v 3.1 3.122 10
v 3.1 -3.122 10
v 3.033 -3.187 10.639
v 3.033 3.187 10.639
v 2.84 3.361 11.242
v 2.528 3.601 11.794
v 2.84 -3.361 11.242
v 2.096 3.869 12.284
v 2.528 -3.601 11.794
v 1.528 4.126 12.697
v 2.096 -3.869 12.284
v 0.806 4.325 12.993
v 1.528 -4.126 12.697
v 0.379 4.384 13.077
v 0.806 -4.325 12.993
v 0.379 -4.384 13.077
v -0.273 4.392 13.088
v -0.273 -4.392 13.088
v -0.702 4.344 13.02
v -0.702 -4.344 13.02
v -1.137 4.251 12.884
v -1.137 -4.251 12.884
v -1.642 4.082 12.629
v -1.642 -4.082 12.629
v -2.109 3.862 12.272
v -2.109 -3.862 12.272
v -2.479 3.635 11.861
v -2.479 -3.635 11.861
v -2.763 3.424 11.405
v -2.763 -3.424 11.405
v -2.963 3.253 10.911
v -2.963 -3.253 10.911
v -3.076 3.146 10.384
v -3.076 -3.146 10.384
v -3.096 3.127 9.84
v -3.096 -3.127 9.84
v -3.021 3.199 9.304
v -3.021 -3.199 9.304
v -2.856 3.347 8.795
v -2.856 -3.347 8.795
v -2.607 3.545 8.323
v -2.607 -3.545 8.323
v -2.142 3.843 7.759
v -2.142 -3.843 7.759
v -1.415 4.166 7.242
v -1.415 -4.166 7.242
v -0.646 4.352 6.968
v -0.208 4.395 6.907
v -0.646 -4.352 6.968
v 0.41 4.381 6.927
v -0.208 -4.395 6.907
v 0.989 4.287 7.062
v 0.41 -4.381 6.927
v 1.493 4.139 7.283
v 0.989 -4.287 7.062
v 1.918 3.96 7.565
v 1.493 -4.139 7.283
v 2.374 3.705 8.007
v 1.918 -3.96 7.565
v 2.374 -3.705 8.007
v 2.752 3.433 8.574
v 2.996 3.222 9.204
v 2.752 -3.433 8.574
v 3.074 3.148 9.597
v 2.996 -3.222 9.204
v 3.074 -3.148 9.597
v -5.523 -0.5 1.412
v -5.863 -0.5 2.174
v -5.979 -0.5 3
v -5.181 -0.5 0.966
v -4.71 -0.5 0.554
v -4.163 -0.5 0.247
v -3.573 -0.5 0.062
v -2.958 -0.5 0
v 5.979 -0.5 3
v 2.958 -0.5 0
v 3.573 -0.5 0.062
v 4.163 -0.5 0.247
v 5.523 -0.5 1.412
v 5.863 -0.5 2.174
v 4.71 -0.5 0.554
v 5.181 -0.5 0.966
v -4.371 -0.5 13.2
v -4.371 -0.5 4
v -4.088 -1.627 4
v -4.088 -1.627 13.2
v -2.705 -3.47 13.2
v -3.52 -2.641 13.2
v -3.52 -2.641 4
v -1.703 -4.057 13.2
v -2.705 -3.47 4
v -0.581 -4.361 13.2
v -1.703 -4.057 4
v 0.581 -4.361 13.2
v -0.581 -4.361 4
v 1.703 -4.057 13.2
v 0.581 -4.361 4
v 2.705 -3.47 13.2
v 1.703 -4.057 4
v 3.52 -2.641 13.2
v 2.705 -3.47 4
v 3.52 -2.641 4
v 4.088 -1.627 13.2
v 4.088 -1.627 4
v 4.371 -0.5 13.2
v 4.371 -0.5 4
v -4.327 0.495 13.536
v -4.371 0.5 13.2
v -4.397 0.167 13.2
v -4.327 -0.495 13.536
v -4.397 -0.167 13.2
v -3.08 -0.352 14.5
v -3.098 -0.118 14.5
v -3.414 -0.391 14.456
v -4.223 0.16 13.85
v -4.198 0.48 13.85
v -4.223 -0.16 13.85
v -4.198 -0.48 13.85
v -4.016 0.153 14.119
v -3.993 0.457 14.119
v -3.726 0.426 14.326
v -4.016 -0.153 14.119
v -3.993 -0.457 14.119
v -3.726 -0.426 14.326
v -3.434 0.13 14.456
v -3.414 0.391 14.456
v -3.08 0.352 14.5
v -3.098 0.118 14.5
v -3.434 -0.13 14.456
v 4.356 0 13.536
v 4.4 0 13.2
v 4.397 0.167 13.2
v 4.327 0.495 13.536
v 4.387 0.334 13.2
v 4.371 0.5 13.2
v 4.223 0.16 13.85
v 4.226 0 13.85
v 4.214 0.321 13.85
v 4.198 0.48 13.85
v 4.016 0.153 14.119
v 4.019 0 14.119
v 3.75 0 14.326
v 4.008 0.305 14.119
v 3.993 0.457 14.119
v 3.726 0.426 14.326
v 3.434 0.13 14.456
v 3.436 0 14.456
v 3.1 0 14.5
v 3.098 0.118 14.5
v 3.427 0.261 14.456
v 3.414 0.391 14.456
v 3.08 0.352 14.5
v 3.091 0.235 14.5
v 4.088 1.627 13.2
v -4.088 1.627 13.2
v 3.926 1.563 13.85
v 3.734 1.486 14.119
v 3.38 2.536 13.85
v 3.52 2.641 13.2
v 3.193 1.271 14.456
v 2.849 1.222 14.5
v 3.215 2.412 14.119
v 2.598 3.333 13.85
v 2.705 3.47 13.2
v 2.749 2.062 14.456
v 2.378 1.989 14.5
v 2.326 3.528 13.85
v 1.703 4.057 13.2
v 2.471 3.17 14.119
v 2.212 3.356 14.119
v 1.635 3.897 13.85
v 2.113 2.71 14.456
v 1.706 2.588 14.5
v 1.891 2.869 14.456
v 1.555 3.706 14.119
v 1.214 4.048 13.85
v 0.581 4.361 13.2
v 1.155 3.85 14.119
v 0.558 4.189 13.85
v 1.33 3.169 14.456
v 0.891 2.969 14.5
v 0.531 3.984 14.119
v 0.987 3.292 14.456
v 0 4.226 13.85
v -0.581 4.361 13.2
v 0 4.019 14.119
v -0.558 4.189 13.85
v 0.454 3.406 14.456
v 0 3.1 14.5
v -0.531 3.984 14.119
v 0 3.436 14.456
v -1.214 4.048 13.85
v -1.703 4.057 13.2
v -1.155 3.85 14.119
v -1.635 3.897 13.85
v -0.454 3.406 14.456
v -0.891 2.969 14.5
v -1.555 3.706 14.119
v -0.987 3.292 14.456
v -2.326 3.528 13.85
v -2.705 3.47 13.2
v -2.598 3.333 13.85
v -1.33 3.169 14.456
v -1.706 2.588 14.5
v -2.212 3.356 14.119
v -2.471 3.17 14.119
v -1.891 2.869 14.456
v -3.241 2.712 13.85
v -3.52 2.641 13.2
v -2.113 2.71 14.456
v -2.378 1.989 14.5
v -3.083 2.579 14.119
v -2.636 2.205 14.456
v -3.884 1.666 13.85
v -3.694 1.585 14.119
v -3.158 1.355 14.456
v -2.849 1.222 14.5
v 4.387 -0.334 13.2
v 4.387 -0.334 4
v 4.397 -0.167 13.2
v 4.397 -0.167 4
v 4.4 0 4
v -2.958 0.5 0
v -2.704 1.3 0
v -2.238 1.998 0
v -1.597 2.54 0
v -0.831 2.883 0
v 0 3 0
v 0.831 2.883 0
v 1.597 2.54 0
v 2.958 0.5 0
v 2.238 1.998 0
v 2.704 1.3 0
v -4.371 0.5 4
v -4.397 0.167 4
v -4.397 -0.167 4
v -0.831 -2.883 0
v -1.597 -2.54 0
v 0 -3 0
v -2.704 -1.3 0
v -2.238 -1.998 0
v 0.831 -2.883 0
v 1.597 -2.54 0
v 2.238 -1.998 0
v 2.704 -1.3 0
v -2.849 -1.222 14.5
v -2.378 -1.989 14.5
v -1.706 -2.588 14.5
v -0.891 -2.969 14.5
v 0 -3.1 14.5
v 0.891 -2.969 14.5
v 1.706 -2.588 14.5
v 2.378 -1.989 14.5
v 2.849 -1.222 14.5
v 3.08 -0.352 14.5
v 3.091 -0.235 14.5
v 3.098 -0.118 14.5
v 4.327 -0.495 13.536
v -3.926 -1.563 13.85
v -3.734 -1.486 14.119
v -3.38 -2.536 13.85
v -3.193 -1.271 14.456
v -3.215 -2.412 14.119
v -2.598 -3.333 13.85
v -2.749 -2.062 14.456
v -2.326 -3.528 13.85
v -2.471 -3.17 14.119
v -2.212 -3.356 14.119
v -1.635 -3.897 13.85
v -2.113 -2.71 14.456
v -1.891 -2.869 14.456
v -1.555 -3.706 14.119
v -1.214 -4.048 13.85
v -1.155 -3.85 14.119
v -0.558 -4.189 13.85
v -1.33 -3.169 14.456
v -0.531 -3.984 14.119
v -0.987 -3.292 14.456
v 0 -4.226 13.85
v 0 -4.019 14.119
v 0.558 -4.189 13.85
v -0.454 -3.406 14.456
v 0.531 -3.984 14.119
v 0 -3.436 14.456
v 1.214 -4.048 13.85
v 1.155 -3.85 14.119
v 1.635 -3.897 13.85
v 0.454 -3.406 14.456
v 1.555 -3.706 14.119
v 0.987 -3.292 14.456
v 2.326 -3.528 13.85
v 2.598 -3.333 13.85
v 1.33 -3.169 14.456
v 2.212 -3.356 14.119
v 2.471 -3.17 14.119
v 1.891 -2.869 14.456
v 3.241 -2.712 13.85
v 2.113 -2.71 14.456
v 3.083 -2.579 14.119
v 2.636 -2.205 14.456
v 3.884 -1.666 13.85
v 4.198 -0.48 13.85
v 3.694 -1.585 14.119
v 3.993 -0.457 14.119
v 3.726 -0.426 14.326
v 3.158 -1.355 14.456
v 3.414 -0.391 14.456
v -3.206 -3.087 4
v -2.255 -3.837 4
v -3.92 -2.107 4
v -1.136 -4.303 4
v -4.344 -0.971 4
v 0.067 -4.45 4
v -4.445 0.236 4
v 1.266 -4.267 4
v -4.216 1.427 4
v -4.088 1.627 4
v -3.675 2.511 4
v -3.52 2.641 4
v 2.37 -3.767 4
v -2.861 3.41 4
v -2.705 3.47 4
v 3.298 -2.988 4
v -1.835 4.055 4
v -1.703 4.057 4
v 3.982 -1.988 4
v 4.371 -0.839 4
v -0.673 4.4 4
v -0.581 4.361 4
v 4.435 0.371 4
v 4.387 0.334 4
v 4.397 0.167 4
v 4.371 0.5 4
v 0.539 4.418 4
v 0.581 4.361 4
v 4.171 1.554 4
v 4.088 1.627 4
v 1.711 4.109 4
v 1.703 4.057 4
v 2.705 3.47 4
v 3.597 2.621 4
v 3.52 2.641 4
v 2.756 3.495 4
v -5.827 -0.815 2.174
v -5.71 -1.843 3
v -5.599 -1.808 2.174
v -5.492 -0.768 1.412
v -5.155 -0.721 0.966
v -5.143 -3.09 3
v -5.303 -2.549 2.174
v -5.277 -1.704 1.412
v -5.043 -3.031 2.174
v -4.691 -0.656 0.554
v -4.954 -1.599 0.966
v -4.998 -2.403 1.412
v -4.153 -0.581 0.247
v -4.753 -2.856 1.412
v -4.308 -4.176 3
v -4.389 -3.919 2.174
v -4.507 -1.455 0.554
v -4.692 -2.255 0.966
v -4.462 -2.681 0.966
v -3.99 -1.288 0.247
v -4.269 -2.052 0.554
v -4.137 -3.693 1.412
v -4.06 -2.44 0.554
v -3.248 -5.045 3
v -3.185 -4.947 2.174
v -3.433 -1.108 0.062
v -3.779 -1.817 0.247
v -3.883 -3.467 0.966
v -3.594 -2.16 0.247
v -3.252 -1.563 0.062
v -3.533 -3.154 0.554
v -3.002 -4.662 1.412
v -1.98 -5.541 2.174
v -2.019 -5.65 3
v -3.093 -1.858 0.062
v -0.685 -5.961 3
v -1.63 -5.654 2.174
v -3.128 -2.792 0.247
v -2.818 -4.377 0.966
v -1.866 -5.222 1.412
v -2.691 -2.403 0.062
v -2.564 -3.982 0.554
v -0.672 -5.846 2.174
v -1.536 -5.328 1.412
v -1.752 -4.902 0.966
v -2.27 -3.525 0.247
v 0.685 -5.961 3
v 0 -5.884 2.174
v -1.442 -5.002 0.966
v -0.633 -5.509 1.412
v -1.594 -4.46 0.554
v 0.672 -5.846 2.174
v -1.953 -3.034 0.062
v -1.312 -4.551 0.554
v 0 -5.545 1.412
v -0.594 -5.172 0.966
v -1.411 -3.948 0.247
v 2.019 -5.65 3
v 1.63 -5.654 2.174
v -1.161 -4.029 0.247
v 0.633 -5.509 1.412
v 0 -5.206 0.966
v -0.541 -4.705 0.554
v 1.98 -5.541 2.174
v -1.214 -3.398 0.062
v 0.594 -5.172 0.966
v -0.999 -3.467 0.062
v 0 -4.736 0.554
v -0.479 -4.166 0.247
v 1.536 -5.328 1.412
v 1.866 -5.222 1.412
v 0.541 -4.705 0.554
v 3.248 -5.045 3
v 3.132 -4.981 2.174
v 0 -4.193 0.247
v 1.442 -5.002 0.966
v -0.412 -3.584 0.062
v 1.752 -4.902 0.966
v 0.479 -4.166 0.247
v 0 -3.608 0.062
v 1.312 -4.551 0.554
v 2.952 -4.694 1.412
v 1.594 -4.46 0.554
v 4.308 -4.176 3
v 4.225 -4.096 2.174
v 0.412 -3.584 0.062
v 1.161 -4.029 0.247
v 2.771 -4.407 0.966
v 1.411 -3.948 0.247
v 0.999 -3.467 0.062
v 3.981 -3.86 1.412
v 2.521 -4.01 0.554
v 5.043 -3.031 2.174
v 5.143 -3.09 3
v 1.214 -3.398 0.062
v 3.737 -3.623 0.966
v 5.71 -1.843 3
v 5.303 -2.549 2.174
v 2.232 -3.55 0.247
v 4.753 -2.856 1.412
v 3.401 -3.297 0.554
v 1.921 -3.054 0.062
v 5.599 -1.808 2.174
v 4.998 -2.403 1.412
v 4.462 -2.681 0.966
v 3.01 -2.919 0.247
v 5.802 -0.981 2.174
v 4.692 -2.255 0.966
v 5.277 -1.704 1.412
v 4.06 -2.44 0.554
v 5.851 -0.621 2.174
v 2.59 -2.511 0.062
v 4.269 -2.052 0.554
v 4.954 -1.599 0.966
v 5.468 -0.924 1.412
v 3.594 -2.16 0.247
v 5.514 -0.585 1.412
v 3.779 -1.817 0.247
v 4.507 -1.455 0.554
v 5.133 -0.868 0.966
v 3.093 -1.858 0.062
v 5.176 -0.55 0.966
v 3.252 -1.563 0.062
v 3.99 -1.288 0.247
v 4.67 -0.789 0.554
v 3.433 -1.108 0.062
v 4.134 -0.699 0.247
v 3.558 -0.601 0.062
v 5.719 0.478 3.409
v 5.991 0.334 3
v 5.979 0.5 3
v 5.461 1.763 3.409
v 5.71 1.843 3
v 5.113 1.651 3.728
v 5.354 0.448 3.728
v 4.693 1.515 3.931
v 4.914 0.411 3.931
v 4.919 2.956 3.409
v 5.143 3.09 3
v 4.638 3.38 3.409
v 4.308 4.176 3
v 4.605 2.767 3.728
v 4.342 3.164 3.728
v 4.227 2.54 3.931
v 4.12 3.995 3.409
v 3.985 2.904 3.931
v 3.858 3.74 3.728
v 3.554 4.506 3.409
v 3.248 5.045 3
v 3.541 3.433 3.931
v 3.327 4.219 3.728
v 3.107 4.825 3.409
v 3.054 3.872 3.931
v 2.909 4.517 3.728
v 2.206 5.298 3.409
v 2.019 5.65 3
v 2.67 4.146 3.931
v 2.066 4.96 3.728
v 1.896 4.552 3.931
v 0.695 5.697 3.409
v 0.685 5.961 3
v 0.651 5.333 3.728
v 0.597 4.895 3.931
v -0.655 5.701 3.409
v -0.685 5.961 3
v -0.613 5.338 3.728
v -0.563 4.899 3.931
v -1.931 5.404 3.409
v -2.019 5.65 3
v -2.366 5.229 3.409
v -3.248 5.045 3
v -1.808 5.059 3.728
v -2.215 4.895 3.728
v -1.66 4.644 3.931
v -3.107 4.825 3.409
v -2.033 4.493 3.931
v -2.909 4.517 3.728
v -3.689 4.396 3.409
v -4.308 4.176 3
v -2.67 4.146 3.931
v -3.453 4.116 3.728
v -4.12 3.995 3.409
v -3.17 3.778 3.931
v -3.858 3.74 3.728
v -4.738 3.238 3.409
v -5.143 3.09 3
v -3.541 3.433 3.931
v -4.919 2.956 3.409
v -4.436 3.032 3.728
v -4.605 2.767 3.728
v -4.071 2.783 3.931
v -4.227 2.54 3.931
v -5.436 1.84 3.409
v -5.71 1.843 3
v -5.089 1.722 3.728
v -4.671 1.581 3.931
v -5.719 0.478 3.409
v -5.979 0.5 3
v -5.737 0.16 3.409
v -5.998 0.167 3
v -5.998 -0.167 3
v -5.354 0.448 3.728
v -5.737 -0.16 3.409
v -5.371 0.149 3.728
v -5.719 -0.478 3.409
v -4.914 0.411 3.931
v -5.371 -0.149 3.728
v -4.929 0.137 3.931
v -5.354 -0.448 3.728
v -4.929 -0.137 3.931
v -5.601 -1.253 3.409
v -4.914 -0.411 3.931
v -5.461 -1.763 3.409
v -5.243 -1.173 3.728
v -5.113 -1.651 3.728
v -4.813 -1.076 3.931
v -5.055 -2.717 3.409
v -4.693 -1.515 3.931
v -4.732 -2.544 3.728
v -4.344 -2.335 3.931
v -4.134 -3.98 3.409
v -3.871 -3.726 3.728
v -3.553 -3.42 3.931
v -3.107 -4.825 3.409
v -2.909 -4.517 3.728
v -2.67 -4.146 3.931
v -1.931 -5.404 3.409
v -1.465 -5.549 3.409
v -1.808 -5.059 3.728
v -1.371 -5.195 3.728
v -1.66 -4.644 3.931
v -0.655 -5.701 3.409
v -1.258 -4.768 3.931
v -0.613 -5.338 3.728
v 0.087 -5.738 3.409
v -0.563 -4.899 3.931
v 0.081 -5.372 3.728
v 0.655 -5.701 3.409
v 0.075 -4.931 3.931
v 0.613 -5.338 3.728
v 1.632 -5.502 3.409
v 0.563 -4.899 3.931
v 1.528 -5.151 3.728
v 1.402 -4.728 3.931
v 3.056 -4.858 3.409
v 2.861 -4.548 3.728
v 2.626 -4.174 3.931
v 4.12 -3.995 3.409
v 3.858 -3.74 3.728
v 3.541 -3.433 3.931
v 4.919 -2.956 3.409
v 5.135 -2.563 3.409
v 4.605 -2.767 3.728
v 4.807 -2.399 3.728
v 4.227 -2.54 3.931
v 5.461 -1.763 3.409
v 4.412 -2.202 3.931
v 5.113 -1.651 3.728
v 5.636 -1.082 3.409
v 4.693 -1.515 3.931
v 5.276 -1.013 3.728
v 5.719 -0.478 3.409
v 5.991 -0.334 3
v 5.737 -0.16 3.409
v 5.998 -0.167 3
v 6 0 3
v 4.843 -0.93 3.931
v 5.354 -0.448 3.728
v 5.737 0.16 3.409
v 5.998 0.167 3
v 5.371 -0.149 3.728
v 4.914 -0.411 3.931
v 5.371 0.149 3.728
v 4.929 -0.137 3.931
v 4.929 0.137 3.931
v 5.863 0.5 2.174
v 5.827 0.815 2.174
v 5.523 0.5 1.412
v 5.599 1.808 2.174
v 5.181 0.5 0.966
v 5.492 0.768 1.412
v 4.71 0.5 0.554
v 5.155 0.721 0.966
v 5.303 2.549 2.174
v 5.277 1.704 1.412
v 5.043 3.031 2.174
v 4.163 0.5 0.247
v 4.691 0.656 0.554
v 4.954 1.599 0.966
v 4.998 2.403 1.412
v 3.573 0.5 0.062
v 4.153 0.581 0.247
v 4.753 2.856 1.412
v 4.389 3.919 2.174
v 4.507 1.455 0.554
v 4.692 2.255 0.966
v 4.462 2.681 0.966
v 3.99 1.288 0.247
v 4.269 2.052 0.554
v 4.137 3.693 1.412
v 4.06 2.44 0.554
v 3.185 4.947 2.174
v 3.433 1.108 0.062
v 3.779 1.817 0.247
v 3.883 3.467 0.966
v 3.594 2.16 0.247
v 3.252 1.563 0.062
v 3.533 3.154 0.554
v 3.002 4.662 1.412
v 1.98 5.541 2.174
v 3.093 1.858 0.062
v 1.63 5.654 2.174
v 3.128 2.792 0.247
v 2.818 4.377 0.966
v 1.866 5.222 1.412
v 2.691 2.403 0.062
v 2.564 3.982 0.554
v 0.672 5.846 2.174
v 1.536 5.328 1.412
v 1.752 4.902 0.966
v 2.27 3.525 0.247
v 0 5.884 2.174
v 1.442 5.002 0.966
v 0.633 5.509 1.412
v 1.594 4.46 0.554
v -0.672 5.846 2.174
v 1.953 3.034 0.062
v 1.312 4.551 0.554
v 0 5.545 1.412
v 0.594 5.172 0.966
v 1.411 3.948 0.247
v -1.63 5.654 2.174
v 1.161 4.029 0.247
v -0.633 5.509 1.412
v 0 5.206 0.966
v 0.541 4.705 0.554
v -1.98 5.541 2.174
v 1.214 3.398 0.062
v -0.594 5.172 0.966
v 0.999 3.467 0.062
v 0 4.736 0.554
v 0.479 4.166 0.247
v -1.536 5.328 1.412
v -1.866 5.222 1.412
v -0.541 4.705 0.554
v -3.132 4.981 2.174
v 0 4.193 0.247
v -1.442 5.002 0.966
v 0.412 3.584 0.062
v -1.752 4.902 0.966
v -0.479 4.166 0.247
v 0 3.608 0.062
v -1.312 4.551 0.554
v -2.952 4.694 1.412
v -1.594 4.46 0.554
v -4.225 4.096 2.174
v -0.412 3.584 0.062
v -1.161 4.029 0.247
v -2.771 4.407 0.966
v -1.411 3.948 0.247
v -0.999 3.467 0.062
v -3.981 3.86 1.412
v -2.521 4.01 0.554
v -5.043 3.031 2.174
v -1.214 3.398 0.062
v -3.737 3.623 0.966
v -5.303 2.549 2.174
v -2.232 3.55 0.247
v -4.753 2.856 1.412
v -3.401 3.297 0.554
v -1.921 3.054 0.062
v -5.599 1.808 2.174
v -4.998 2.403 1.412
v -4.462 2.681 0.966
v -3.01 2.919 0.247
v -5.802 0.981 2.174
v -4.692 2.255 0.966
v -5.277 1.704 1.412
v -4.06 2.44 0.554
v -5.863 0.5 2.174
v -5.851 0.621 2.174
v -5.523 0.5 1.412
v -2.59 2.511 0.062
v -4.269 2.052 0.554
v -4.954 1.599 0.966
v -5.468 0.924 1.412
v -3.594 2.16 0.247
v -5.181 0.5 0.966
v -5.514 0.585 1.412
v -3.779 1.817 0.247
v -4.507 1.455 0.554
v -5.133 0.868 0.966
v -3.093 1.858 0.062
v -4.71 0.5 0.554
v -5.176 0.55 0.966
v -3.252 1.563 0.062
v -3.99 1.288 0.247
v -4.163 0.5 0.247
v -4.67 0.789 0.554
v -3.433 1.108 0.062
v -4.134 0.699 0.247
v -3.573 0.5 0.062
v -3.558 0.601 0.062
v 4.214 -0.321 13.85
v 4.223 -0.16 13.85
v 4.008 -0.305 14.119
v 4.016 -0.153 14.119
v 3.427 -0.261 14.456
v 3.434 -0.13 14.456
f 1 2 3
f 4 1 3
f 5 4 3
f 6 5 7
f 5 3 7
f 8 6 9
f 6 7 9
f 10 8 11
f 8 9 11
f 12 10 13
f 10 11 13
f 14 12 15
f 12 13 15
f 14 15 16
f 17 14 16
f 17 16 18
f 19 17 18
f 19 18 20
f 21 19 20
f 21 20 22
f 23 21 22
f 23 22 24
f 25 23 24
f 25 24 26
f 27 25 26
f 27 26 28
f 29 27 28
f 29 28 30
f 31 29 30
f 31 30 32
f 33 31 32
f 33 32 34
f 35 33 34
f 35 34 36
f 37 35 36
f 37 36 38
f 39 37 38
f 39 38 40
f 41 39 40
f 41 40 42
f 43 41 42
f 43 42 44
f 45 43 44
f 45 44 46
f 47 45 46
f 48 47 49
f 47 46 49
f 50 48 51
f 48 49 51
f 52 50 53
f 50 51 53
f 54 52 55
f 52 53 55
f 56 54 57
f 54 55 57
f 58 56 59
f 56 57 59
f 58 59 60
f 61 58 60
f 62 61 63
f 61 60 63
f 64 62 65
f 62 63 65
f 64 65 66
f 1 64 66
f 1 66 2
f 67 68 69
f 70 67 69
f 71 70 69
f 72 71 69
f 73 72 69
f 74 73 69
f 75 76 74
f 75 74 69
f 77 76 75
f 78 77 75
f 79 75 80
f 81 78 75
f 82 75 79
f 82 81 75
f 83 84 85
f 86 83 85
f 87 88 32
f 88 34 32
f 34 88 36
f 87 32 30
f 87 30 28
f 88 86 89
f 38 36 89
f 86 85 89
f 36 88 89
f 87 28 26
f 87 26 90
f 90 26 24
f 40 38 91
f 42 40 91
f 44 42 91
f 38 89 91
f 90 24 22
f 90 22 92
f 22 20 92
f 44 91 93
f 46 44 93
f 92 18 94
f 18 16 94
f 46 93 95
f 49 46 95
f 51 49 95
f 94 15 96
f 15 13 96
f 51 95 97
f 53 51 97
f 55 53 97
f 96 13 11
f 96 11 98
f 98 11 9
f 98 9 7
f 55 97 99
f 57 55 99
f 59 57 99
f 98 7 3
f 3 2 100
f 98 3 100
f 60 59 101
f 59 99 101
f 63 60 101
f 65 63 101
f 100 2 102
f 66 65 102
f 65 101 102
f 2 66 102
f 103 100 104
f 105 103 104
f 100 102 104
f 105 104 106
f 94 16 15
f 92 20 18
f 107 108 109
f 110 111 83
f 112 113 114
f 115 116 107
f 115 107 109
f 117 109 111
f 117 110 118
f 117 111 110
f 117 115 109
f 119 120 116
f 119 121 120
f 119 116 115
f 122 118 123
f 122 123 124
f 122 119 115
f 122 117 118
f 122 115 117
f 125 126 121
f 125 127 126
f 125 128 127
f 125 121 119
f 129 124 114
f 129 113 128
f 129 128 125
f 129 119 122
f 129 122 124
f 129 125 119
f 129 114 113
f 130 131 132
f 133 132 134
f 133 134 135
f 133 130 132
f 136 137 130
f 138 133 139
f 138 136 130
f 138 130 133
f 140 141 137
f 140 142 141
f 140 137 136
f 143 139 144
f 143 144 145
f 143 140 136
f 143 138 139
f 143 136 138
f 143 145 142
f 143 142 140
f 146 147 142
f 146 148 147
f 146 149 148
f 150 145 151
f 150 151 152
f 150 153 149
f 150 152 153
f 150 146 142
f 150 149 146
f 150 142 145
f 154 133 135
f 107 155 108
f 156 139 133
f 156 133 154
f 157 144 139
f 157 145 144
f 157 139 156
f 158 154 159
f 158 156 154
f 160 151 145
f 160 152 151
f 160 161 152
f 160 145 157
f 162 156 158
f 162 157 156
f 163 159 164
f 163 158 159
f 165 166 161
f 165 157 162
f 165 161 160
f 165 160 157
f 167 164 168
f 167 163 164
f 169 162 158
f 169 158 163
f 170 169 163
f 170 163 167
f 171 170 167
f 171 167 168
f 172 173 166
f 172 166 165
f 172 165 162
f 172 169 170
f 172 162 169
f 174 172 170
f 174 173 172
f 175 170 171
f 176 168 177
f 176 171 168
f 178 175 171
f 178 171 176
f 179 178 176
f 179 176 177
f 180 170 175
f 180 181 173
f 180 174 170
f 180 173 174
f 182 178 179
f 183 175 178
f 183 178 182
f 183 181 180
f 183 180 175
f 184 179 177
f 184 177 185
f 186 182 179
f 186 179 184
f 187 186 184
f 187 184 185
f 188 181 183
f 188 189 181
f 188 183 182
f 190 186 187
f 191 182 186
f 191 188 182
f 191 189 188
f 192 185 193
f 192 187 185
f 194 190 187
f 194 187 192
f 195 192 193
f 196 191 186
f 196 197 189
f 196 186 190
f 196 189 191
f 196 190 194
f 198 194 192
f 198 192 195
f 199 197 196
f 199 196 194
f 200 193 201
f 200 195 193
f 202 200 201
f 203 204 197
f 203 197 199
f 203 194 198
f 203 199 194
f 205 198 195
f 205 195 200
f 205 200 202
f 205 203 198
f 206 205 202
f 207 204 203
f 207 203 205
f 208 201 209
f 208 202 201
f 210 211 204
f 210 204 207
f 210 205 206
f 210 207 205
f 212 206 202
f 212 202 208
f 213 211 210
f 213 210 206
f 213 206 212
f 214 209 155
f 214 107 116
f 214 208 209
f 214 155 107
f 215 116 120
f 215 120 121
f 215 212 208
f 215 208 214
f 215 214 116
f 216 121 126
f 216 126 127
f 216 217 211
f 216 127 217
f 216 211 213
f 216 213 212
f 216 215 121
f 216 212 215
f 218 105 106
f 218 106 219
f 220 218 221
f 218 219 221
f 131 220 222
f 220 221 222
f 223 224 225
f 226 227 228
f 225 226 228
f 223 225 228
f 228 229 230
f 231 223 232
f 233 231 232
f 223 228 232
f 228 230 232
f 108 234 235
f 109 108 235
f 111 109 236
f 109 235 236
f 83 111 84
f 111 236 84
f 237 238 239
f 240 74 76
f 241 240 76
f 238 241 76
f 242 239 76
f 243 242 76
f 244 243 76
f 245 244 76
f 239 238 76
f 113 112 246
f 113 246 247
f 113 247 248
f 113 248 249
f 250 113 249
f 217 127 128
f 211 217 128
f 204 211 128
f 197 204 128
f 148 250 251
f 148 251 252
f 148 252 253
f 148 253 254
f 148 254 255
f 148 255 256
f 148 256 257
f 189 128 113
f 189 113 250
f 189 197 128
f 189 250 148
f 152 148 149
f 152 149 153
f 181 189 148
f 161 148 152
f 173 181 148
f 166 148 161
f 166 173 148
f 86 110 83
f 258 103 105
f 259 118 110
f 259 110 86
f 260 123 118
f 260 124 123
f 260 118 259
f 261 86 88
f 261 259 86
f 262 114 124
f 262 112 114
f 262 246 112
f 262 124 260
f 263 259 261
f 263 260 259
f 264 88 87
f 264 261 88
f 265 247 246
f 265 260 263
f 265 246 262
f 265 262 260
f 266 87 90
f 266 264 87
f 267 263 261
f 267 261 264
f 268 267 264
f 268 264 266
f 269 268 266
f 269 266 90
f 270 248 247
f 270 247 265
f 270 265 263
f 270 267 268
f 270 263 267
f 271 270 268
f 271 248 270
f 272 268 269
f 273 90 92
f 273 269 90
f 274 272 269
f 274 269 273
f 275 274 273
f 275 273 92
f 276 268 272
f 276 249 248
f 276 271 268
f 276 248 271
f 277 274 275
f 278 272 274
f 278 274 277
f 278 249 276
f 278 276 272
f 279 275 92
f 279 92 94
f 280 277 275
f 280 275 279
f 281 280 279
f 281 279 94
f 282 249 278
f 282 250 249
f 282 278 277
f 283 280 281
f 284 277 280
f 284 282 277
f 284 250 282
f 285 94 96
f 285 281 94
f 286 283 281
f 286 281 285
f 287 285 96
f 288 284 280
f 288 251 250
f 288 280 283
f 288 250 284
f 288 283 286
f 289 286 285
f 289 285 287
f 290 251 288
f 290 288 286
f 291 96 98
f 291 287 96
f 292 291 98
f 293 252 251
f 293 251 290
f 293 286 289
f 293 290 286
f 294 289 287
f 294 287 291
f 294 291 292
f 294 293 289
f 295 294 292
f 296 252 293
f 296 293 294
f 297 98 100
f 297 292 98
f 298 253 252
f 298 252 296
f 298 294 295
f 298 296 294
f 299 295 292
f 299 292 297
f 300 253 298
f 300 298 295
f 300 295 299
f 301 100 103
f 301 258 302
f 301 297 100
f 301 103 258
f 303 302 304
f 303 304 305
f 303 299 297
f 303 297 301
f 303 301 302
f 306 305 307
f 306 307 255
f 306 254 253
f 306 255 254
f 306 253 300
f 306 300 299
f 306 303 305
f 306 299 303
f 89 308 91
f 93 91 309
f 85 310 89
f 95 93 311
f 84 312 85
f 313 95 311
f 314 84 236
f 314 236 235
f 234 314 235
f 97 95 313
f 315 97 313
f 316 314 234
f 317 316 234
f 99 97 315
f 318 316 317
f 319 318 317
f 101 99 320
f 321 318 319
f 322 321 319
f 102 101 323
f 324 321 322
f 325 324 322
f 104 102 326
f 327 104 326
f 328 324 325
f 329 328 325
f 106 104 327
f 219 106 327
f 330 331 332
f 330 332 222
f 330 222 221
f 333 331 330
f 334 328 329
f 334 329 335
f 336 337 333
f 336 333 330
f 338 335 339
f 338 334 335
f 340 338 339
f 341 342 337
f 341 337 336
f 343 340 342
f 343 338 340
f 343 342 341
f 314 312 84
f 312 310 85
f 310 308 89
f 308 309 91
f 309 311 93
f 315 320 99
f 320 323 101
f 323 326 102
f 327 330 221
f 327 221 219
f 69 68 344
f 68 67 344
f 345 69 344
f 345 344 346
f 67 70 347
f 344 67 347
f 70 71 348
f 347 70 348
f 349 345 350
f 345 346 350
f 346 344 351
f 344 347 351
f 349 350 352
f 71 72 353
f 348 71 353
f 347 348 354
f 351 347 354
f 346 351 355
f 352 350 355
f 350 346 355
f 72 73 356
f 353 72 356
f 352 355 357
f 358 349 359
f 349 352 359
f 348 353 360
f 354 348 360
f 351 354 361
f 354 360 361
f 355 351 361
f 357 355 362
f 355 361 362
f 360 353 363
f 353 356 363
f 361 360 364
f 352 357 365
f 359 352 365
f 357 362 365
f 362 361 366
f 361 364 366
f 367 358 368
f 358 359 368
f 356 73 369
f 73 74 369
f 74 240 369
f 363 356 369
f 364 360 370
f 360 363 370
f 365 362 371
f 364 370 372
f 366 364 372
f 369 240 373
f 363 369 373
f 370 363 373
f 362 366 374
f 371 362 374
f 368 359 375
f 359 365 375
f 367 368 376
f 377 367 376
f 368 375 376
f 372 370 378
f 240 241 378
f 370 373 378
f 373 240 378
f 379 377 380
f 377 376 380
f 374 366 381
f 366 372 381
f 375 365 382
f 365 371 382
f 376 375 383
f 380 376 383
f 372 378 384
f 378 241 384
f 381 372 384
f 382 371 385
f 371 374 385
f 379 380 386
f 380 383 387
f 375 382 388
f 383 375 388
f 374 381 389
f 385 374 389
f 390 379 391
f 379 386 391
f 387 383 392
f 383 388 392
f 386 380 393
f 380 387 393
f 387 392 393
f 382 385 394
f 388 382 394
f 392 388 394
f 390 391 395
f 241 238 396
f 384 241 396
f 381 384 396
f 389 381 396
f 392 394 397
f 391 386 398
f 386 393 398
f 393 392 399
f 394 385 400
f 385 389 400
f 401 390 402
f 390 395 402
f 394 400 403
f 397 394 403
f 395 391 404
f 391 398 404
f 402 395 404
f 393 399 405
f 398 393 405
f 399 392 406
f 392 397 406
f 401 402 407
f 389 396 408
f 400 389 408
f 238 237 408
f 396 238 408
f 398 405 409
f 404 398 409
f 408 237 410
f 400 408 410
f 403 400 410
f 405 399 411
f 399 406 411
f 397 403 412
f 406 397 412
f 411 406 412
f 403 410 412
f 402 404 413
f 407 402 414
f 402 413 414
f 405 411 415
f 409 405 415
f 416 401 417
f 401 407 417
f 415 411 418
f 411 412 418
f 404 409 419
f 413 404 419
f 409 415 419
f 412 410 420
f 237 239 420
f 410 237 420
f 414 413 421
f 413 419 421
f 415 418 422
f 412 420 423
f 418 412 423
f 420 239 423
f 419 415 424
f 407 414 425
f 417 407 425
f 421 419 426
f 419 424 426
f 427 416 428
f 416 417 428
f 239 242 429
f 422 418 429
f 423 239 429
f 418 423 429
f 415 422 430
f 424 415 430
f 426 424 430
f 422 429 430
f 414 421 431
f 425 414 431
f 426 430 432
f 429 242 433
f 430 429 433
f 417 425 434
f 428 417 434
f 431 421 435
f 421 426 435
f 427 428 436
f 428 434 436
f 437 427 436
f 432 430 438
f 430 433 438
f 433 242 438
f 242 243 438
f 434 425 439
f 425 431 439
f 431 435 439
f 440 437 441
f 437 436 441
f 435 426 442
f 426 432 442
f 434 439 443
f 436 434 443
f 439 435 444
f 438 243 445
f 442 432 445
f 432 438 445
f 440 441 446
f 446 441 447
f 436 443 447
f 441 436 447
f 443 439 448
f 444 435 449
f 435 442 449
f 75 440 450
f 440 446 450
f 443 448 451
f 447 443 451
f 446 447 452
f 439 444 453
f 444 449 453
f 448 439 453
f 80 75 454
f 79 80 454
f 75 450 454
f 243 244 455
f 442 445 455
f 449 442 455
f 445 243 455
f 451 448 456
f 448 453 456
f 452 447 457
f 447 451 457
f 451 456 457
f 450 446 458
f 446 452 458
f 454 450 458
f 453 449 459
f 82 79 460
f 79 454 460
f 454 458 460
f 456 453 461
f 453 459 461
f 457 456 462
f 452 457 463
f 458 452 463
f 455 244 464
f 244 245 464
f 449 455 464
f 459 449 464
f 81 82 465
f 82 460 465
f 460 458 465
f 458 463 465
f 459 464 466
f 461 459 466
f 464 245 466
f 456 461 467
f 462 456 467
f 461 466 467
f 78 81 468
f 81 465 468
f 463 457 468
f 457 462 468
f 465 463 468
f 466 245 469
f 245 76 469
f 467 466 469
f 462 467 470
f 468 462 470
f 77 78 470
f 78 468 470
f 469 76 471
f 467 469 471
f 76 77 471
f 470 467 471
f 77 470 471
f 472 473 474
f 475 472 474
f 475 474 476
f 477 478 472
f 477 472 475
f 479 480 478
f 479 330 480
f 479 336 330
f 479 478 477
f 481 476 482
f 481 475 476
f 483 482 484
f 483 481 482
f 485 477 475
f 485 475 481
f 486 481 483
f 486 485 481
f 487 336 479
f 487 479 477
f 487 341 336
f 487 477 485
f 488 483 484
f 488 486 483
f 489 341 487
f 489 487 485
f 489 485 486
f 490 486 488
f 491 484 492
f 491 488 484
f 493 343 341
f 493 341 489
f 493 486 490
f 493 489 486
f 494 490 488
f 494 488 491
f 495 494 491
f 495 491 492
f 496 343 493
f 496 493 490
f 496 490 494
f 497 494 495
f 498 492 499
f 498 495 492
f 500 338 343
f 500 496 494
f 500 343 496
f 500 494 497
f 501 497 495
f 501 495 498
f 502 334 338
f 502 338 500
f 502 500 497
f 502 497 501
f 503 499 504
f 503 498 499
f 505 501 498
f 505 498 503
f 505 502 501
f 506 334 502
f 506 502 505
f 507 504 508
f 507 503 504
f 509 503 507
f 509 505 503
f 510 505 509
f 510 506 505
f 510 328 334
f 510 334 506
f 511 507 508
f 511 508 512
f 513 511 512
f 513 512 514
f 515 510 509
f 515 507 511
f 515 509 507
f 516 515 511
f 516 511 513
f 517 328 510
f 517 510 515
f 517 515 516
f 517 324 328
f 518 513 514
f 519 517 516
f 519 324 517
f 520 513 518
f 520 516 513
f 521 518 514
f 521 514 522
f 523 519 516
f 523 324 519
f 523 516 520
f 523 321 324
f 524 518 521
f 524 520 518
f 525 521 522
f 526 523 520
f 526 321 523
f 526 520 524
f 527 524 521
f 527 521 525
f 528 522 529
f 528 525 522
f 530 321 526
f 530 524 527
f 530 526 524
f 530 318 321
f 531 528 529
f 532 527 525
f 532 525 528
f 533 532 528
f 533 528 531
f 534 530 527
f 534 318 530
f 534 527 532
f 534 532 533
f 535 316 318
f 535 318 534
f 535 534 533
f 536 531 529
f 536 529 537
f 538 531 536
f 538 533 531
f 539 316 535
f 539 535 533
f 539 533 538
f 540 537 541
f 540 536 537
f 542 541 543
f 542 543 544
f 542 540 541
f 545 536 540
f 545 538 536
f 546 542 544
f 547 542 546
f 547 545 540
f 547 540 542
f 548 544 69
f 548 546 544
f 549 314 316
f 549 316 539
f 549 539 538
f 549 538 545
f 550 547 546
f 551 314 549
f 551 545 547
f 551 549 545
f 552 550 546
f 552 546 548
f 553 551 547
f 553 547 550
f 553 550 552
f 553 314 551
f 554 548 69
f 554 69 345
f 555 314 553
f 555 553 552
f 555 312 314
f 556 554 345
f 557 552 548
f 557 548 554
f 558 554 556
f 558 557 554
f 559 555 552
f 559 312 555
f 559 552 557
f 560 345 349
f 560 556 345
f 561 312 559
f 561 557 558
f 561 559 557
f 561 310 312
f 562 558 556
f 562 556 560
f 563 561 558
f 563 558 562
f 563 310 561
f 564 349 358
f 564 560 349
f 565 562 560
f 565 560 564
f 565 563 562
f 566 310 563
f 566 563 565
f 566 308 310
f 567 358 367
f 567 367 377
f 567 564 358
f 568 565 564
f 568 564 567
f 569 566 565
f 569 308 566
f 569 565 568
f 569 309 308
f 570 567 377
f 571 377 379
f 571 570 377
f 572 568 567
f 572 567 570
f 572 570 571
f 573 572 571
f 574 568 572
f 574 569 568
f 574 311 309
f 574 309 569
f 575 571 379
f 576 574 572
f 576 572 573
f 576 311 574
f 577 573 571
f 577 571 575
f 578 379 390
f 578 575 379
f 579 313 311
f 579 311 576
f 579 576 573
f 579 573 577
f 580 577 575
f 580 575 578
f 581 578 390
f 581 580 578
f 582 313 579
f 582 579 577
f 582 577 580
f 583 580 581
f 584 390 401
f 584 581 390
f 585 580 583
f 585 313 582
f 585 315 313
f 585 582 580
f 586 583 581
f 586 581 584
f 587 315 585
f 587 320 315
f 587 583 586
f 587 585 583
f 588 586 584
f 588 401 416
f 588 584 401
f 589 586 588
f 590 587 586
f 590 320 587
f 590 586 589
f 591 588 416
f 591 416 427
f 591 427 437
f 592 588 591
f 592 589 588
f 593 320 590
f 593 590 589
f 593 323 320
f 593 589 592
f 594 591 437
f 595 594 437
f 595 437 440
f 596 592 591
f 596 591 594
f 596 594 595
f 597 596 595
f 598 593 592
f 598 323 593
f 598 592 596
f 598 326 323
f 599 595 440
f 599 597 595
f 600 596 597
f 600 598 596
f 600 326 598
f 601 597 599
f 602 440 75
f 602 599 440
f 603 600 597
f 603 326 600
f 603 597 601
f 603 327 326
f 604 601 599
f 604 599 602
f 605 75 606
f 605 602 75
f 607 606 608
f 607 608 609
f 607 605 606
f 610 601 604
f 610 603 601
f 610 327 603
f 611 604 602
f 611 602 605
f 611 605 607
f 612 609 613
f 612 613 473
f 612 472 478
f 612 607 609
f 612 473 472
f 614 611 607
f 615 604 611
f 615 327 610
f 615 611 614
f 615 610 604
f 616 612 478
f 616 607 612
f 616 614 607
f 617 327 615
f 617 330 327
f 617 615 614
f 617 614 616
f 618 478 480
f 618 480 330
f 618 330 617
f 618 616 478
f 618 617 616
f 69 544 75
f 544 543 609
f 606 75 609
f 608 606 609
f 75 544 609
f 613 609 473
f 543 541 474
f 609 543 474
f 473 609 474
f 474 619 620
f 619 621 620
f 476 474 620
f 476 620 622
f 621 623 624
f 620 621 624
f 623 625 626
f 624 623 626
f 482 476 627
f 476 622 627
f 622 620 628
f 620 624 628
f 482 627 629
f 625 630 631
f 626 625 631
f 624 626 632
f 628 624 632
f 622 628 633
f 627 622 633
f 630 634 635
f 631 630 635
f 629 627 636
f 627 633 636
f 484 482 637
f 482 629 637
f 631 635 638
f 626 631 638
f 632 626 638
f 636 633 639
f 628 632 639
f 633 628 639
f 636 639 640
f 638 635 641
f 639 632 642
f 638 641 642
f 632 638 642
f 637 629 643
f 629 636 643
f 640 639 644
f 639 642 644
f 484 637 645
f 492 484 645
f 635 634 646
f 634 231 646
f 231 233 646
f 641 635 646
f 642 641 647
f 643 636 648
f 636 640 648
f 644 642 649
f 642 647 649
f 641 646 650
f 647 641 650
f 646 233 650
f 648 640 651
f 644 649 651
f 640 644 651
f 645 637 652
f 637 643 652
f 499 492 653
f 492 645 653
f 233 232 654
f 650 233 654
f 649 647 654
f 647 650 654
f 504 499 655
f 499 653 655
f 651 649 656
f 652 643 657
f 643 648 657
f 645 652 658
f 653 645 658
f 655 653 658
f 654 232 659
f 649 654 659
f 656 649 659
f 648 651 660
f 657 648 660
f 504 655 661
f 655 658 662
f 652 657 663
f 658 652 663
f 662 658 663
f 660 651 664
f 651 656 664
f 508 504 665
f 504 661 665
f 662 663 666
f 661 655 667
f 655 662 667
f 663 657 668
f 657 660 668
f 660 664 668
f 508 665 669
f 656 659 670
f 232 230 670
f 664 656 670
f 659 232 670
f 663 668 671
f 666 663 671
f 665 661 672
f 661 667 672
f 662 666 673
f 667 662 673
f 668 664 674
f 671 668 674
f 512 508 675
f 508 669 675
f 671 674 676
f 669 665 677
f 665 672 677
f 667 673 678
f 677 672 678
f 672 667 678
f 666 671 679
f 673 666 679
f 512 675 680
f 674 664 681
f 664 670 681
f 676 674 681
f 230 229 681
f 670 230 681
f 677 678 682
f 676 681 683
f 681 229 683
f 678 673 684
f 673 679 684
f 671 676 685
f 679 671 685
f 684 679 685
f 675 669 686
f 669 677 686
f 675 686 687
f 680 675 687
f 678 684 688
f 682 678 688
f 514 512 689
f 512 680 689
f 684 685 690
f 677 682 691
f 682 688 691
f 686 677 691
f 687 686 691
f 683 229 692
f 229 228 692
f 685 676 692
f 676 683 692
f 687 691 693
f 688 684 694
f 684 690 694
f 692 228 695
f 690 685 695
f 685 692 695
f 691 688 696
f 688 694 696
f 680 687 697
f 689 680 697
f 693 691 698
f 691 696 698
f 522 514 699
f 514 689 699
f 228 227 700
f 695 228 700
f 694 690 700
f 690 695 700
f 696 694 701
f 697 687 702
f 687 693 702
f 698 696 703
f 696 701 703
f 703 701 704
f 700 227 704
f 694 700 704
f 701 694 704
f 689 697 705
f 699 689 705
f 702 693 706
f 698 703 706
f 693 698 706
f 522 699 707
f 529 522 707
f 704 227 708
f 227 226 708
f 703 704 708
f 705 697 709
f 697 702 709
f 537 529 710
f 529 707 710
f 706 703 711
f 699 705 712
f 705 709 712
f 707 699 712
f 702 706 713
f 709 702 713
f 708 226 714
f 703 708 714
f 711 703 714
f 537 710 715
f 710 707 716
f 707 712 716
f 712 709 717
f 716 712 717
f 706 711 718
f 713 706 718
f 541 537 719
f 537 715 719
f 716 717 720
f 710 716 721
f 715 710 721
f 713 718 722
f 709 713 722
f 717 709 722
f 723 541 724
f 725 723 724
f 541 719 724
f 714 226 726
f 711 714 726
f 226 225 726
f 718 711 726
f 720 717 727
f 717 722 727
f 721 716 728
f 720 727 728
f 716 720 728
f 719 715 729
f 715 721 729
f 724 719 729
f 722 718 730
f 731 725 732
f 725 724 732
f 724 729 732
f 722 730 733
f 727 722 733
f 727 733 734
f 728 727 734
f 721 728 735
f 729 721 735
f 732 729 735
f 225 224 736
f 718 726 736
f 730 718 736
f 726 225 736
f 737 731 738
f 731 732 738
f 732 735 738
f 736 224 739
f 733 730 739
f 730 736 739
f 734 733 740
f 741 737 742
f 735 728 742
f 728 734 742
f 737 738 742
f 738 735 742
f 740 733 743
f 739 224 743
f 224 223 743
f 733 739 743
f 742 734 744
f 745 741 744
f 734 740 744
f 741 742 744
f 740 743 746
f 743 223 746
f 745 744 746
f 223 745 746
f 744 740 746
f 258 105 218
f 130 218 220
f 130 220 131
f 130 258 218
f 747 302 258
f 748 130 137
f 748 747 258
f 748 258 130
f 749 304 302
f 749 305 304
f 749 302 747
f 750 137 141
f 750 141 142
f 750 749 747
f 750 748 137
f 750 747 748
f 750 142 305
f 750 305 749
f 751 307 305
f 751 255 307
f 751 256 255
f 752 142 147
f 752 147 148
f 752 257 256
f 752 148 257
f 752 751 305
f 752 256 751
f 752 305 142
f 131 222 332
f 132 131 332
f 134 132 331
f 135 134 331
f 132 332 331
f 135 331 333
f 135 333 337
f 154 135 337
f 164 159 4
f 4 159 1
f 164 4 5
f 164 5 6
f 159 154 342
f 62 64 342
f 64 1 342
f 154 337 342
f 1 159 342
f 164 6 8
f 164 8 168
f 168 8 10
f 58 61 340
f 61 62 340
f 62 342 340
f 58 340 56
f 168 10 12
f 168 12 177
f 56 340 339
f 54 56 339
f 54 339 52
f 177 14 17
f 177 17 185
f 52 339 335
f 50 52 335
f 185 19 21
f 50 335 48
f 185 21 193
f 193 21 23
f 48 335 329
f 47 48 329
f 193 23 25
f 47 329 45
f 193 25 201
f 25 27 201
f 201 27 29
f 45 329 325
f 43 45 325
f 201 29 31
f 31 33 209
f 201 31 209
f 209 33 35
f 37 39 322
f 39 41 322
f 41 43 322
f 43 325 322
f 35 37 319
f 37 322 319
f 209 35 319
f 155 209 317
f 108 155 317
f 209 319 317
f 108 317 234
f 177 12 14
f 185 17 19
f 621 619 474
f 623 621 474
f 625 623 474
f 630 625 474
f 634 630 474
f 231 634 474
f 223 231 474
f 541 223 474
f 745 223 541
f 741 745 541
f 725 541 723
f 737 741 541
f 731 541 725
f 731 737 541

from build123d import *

# Parameters (mm, degrees)
F1_DEPTH = 14.5
F2_DEPTH = 4
F3_DEPTH = 3
F5_R     = 3.1
F6_DEPTH = 10.751
F7_R     = 3
F9_R     = 1.3


# Not quite as in the source:
# - a fillet or chamfer that OpenCascade refuses, or shapes differently, is made with other operations: its cross-section is extruded or revolved along the edge and cut away or added


with BuildPart() as f1:
    # F0 (on Top) → F1 (new body)
    with BuildSketch(Plane.XY):
        with BuildLine():
            Line((-4.3714985989, 0.5), (4.3714985989, 0.5))
            ThreePointArc((4.3714985989, 0.5), (0, 4.4), (-4.3714985989, 0.5))
        make_face()
        with BuildLine():
            ThreePointArc((4.3714985989, -0.5), (4.392868871, -0.2504058355), (4.4, 0))
            ThreePointArc((4.4, 0), (4.392868871, 0.2504058355), (4.3714985989, 0.5))
            Line((4.3714985989, 0.5), (-4.3714985989, 0.5))
            ThreePointArc((-4.3714985989, 0.5), (-4.4, 0), (-4.3714985989, -0.5))
            Line((-4.3714985989, -0.5), (4.3714985989, -0.5))
        make_face()
        with BuildLine():
            ThreePointArc((-4.3714985989, -0.5), (0, -4.4), (4.3714985989, -0.5))
            Line((4.3714985989, -0.5), (-4.3714985989, -0.5))
        make_face()
    extrude(amount=F1_DEPTH)

    # F0 (on Top) → F2 (join)
    with BuildSketch(Plane.XY):
        with BuildLine():
            ThreePointArc((-4.3714985989, -0.5), (-4.4, 0), (-4.3714985989, 0.5))
            Line((-4.3714985989, 0.5), (-5.9791303716, 0.5))
            ThreePointArc((-5.9791303716, 0.5), (-6, 0), (-5.9791303716, -0.5))
            Line((-5.9791303716, -0.5), (-4.3714985989, -0.5))
        make_face()
        with BuildLine():
            Line((5.9791303716, -0.5), (4.3714985989, -0.5))
            ThreePointArc((4.3714985989, -0.5), (0, -4.4), (-4.3714985989, -0.5))
            Line((-4.3714985989, -0.5), (-5.9791303716, -0.5))
            ThreePointArc((-5.9791303716, -0.5), (0, -6), (5.9791303716, -0.5))
        make_face()
        with BuildLine():
            ThreePointArc((4.3714985989, 0.5), (4.392868871, 0.2504058355), (4.4, 0))
            ThreePointArc((4.4, 0), (4.392868871, -0.2504058355), (4.3714985989, -0.5))
            Line((4.3714985989, -0.5), (5.9791303716, -0.5))
            ThreePointArc((5.9791303716, -0.5), (5.9947803225, -0.2502176759), (6, 0))
            ThreePointArc((6, 0), (5.9947803225, 0.2502176759), (5.9791303716, 0.5))
            Line((5.9791303716, 0.5), (4.3714985989, 0.5))
        make_face()
        with BuildLine():
            ThreePointArc((-4.3714985989, 0.5), (0, 4.4), (4.3714985989, 0.5))
            Line((4.3714985989, 0.5), (5.9791303716, 0.5))
            ThreePointArc((5.9791303716, 0.5), (0, 6), (-5.9791303716, 0.5))
            Line((-5.9791303716, 0.5), (-4.3714985989, 0.5))
        make_face()
    extrude(amount=F2_DEPTH)

    # F0 (on Top) → F3 (cut)
    with BuildSketch(Plane.XY):
        with BuildLine():
            ThreePointArc((-4.3714985989, -0.5), (-4.4, 0), (-4.3714985989, 0.5))
            Line((-4.3714985989, 0.5), (-5.9791303716, 0.5))
            ThreePointArc((-5.9791303716, 0.5), (-6, 0), (-5.9791303716, -0.5))
            Line((-5.9791303716, -0.5), (-4.3714985989, -0.5))
        make_face()
        with BuildLine():
            ThreePointArc((4.3714985989, -0.5), (4.392868871, -0.2504058355), (4.4, 0))
            ThreePointArc((4.4, 0), (4.392868871, 0.2504058355), (4.3714985989, 0.5))
            Line((4.3714985989, 0.5), (-4.3714985989, 0.5))
            ThreePointArc((-4.3714985989, 0.5), (-4.4, 0), (-4.3714985989, -0.5))
            Line((-4.3714985989, -0.5), (4.3714985989, -0.5))
        make_face()
        with BuildLine():
            ThreePointArc((4.3714985989, 0.5), (4.392868871, 0.2504058355), (4.4, 0))
            ThreePointArc((4.4, 0), (4.392868871, -0.2504058355), (4.3714985989, -0.5))
            Line((4.3714985989, -0.5), (5.9791303716, -0.5))
            ThreePointArc((5.9791303716, -0.5), (5.9947803225, -0.2502176759), (6, 0))
            ThreePointArc((6, 0), (5.9947803225, 0.2502176759), (5.9791303716, 0.5))
            Line((5.9791303716, 0.5), (4.3714985989, 0.5))
        make_face()
    extrude(amount=F3_DEPTH, mode=Mode.SUBTRACT)

    # F5 (on offset) → F6 (cut, through all)
    with BuildSketch(Plane.XZ.offset(4.75)):
        with Locations((0, 10)):
            Circle(F5_R)
    extrude(amount=-F6_DEPTH, mode=Mode.SUBTRACT)

    # F7
    f7_edges = [f1.edges().sort_by_distance(p)[0] for p in [
        (0, 6, 0),
        (0, -6, 0),
    ]]
    fillet(f7_edges, radius=F7_R)

    # F8: fillet of radius 1.7 on 1 edges, made by hand

    # F8_s1 → F8_t2 (revolve, cut)
    with BuildSketch(Plane(origin=(0, 0, 0), x_dir=(0, 0, 1), z_dir=(0.0833333333, -0.9965217286, 0))):
        with BuildLine():
            ThreePointArc((3, -6), (3.7282856857, -5.3727611072), (4, -4.4508066615))
            Line((4, -4.4508066615), (4.034, -4.4508066615))
            Line((4.034, -4.4508066615), (4.034, -6))
            Line((4.034, -6), (4, -6.034))
            ThreePointArc((4, -6.034), (3.5, -6.034), (3.014, -6.0309838668))
            Line((3.014, -6.0309838668), (3, -6))
        make_face()
    revolve(axis=Axis((0, 0, 4), (0, 0, 1)), mode=Mode.SUBTRACT)

    # F9
    f9_edges = [f1.edges().sort_by_distance(p)[0] for p in [
        (4.371499, 0.5, 14.5),
    ]]
    fillet(f9_edges, radius=F9_R)


solid = f1.part
